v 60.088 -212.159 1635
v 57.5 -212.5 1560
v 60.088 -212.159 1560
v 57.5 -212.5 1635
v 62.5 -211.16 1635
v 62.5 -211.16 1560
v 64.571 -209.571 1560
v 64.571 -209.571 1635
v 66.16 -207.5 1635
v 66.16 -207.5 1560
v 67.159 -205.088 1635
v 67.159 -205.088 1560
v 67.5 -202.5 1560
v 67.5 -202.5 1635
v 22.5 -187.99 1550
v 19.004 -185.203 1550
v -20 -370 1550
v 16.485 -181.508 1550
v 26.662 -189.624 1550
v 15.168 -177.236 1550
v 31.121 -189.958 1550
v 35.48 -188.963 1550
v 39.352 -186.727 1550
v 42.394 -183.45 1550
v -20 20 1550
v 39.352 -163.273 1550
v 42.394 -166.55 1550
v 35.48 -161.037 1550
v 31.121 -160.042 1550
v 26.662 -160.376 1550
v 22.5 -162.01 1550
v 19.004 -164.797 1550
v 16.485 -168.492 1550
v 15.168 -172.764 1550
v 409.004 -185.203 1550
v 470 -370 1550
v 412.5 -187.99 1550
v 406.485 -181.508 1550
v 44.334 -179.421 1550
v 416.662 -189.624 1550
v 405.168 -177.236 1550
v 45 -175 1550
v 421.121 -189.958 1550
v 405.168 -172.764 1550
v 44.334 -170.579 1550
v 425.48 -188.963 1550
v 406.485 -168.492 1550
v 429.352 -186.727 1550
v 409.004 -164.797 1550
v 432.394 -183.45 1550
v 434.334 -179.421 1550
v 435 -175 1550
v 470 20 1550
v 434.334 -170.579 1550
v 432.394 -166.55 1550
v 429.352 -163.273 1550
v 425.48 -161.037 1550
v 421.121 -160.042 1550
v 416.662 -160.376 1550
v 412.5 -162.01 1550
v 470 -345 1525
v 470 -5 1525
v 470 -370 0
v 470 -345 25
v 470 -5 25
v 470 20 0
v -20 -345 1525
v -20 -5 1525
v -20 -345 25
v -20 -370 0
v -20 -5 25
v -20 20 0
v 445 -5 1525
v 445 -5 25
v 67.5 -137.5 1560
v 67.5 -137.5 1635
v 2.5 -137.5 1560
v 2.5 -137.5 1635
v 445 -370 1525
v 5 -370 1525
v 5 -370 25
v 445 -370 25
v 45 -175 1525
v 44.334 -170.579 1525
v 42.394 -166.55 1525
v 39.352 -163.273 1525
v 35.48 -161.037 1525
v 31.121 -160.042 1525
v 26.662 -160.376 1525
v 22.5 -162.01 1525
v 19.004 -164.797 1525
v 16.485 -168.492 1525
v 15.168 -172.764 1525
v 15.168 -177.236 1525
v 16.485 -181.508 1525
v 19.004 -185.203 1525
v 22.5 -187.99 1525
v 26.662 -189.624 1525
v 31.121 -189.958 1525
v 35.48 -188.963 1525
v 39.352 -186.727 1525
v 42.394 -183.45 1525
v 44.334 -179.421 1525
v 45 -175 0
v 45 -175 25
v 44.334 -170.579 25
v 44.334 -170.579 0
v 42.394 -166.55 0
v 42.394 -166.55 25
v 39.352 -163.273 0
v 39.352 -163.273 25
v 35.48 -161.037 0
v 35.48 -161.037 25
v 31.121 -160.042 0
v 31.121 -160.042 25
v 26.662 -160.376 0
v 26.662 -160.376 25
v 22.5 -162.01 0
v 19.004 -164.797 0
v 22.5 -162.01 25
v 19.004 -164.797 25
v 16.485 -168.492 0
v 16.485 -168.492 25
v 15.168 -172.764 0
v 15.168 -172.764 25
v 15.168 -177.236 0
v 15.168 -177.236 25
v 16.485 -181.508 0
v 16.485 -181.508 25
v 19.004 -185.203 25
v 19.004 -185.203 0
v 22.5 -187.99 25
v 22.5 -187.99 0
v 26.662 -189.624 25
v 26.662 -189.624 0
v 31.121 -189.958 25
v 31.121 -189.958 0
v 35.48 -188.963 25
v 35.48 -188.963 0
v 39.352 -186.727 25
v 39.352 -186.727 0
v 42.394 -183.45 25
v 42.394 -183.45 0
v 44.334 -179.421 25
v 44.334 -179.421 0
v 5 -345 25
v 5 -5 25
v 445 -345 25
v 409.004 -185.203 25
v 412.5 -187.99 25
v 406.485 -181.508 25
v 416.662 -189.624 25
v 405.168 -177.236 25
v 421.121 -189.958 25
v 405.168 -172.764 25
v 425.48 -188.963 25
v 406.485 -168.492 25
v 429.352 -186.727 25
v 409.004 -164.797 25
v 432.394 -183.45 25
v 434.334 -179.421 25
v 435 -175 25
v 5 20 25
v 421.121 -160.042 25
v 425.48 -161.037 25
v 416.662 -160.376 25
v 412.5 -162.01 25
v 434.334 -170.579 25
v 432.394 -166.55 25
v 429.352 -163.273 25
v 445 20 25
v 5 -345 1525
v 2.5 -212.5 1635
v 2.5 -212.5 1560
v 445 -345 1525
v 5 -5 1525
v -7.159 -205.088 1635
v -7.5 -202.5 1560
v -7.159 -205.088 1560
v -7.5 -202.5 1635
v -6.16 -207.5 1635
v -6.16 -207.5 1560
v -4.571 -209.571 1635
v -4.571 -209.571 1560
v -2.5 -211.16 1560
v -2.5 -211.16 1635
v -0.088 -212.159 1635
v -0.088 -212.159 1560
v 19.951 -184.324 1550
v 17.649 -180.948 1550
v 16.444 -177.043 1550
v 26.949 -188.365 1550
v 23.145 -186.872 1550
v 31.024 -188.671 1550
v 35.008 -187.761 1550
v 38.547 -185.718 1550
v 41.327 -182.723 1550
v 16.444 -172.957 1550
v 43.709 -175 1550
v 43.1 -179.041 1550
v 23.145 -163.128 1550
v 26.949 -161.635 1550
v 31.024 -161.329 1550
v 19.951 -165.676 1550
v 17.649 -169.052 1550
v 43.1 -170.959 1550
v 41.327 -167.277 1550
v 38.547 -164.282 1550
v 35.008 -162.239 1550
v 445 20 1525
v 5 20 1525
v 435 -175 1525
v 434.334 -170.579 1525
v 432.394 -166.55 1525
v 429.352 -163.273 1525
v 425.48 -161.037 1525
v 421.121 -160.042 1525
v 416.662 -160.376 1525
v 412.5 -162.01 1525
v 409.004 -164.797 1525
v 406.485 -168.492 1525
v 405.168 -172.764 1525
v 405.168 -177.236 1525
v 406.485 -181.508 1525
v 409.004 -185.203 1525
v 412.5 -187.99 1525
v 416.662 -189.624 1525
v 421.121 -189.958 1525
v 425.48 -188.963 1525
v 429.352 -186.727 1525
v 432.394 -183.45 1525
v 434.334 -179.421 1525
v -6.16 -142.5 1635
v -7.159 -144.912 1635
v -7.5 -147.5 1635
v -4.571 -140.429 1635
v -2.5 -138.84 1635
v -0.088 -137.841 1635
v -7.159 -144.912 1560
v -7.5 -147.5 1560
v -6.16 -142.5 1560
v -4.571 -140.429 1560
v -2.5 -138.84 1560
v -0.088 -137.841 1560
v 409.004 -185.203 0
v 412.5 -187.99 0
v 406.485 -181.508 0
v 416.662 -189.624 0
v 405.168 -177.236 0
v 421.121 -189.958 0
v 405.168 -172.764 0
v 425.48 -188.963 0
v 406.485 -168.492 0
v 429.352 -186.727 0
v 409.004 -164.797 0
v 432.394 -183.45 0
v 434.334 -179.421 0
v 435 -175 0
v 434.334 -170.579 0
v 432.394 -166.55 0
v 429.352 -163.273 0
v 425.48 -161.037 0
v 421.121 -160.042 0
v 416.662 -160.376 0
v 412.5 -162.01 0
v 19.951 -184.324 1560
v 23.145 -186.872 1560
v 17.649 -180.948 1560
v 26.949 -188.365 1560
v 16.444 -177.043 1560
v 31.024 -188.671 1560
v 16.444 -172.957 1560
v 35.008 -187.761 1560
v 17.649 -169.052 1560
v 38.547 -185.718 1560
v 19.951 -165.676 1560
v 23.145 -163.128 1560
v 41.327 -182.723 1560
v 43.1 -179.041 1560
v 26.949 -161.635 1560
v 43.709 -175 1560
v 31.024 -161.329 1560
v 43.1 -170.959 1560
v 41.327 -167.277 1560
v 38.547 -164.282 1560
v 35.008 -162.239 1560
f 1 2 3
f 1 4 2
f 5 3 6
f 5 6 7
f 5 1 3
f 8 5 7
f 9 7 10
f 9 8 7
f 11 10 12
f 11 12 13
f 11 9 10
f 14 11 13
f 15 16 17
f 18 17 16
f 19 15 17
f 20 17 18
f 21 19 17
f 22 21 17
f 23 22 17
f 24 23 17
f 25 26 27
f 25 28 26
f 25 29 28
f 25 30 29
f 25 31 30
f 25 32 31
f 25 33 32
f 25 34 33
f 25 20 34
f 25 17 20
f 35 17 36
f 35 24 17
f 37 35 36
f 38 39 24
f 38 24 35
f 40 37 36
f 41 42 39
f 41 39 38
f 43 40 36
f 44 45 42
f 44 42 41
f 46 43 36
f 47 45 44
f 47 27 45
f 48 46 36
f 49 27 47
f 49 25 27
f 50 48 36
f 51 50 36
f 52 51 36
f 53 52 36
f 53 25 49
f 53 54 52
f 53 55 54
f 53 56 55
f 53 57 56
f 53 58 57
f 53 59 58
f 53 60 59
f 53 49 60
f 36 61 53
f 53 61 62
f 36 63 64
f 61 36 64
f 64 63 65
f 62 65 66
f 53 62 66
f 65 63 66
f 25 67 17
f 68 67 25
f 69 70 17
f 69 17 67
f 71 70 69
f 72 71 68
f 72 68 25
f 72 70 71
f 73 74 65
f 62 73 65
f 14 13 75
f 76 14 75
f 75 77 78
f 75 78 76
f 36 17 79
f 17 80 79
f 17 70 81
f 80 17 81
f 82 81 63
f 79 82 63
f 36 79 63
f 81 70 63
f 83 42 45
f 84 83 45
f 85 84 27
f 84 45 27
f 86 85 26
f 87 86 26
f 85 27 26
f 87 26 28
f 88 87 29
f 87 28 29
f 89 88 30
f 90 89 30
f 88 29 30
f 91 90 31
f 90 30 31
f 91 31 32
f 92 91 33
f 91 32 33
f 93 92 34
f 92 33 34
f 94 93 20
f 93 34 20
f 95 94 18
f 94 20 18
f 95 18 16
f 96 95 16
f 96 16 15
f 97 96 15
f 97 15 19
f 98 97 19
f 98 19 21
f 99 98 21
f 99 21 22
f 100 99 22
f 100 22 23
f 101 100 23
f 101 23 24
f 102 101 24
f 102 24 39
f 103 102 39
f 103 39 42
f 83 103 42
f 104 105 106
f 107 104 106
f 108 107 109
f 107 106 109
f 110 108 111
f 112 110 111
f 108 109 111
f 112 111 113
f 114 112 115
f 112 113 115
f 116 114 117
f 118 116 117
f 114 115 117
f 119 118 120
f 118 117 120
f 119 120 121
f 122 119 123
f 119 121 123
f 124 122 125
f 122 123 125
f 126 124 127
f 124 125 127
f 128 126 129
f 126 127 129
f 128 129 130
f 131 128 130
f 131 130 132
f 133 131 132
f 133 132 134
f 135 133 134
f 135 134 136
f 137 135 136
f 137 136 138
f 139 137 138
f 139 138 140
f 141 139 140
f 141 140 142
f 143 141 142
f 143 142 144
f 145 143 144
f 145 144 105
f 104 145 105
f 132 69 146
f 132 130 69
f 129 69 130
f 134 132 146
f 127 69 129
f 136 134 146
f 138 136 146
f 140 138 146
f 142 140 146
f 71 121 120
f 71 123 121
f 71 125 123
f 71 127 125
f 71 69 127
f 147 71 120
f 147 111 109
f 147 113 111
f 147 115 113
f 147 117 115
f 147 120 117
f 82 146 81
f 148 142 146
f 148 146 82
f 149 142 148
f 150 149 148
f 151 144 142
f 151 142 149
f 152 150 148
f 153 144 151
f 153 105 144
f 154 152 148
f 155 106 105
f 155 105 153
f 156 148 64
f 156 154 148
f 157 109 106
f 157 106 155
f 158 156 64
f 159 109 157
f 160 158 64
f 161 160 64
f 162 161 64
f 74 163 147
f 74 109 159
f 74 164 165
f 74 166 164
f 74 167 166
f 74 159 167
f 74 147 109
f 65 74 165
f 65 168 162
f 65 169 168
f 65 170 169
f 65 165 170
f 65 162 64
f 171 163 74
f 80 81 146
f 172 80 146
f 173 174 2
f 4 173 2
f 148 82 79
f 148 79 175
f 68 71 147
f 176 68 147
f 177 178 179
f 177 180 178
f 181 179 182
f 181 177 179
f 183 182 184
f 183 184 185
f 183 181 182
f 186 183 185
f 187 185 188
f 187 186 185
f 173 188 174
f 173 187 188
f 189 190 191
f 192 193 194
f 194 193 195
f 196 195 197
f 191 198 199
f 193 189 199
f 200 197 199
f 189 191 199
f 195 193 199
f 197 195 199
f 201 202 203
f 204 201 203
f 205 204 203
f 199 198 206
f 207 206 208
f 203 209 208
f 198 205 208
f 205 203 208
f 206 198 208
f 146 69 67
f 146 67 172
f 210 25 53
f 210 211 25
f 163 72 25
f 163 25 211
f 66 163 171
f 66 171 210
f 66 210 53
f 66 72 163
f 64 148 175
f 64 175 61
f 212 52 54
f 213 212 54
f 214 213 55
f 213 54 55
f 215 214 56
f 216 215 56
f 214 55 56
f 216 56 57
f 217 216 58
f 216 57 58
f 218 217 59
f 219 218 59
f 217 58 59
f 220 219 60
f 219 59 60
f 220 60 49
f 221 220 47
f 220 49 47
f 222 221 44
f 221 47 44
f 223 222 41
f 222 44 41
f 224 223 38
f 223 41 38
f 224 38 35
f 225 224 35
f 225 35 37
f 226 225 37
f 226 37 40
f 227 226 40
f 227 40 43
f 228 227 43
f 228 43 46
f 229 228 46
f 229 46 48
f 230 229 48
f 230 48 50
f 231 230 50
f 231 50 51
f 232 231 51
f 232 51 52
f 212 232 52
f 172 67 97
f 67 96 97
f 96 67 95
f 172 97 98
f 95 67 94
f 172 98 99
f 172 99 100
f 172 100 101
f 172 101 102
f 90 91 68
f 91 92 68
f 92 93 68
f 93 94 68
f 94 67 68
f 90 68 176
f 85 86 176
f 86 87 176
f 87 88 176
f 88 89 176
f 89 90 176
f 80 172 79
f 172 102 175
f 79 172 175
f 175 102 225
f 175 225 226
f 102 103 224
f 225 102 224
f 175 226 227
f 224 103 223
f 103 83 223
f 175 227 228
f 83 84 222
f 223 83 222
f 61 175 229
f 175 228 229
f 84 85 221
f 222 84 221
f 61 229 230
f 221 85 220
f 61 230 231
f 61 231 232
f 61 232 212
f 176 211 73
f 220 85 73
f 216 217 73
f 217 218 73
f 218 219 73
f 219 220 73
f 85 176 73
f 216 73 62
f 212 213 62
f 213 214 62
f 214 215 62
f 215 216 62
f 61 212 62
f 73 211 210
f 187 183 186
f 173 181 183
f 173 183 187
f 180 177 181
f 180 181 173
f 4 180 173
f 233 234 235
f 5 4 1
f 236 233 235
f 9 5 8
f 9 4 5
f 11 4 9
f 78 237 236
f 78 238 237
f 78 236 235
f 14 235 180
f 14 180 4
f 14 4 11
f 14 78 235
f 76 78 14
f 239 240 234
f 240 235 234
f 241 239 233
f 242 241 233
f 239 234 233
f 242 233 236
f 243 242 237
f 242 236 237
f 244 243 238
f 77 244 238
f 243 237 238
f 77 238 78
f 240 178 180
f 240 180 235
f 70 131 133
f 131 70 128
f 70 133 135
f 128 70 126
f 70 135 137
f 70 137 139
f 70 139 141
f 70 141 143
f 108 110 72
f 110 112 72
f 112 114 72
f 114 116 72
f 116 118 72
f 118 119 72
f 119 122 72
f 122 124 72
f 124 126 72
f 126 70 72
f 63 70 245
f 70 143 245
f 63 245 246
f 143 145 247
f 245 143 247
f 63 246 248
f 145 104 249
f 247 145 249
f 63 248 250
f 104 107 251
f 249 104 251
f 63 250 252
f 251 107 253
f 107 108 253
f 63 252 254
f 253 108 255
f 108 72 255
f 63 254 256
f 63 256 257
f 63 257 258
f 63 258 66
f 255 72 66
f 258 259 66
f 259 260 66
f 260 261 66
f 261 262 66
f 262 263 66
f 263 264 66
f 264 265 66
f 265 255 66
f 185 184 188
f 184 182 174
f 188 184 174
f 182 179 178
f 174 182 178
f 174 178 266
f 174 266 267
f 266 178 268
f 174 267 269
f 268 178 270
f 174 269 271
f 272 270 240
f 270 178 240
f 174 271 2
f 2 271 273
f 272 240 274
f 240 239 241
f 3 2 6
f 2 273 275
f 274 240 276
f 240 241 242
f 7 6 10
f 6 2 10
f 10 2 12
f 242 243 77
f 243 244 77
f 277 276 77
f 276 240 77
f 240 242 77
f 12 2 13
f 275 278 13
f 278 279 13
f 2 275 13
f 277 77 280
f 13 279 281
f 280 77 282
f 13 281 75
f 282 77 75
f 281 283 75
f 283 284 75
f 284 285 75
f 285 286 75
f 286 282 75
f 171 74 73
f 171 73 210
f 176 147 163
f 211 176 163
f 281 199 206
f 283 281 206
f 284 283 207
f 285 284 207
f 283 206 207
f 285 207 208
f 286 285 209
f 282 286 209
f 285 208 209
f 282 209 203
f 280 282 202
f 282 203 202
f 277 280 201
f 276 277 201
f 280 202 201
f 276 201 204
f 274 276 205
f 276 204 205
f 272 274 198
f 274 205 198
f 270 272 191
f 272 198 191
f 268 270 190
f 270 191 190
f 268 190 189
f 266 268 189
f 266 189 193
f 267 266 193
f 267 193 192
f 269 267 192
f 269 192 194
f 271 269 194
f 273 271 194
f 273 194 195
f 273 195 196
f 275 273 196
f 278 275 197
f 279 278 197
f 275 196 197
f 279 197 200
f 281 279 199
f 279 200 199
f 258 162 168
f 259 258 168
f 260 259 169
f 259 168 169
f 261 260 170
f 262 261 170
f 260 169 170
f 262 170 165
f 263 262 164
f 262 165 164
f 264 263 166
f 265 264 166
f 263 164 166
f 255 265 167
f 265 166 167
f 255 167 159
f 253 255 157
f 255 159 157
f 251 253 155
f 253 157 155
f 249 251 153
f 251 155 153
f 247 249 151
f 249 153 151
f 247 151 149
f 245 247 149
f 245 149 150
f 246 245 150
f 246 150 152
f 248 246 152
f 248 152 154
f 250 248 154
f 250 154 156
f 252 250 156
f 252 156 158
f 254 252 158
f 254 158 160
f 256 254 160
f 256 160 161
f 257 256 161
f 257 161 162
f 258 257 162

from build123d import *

# Parameters (mm, degrees)
SKETCH1_W           = 490
SKETCH1_H           = 390
BOSS_EXTRUDE1_DEPTH = 25
SKETCH2_W           = 25
SKETCH2_H           = 25
BOSS_EXTRUDE2_DEPTH = 1500
SKETCH3_W           = 490
SKETCH3_H           = 390
BOSS_EXTRUDE3_DEPTH = 25
SKETCH4_R           = 15
CUT_EXTRUDE1_DEPTH  = 1550
SKETCH5_R           = 13.709013017
BOSS_EXTRUDE4_DEPTH = 10
SKETCH6_W           = 75
SKETCH6_H           = 75
BOSS_EXTRUDE5_DEPTH = 75
FILLET1_R           = 10


with BuildPart() as part:
    # Sketch1 → Boss-Extrude1 (new body)
    with BuildSketch(Plane.XY):
        with Locations((225, -175)):
            Rectangle(SKETCH1_W, SKETCH1_H)
    extrude(amount=BOSS_EXTRUDE1_DEPTH)

    # Sketch2 → Boss-Extrude2 (add)
    with BuildSketch(Plane.XY.offset(25)):
        with Locations((-7.5, 7.5)):
            Rectangle(SKETCH2_W, SKETCH2_H)
        with Locations((457.5, 7.5)):
            Rectangle(SKETCH2_W, SKETCH2_H)
        with Locations((457.5, -357.5)):
            Rectangle(SKETCH2_W, SKETCH2_H)
        with Locations((-7.5, -357.5)):
            Rectangle(SKETCH2_W, SKETCH2_H)
    extrude(amount=BOSS_EXTRUDE2_DEPTH)

    # Sketch3 → Boss-Extrude3 (add)
    with BuildSketch(Plane.XY.offset(1525)):
        with Locations((225, -175)):
            Rectangle(SKETCH3_W, SKETCH3_H)
    extrude(amount=BOSS_EXTRUDE3_DEPTH)

    # Sketch4 → Cut-Extrude1 (cut)
    with BuildSketch(Plane.XY.offset(1550)):
        with Locations((420, -175)):
            Circle(SKETCH4_R)
        with Locations((30, -175)):
            Circle(SKETCH4_R)
    extrude(amount=-CUT_EXTRUDE1_DEPTH, mode=Mode.SUBTRACT)


with BuildPart() as body_2:
    # Sketch5 → Boss-Extrude4 (new body)
    with BuildSketch(Plane.XY.offset(1550)):
        with Locations((30, -175)):
            Circle(SKETCH5_R)
    extrude(amount=BOSS_EXTRUDE4_DEPTH)

    # Sketch6 → Boss-Extrude5 (add)
    with BuildSketch(Plane.XY.offset(1560)):
        with Locations((30, -175)):
            Rectangle(SKETCH6_W, SKETCH6_H)
    extrude(amount=BOSS_EXTRUDE5_DEPTH)

    # Fillet1
    fillet1_edges = [body_2.edges().sort_by_distance(p)[0] for p in [
        (67.5, -212.5, 1597.5),
        (-7.5, -137.5, 1597.5),
        (-7.5, -212.5, 1597.5),
    ]]
    fillet(fillet1_edges, radius=FILLET1_R)


solid = Compound([part.part, body_2.part])
